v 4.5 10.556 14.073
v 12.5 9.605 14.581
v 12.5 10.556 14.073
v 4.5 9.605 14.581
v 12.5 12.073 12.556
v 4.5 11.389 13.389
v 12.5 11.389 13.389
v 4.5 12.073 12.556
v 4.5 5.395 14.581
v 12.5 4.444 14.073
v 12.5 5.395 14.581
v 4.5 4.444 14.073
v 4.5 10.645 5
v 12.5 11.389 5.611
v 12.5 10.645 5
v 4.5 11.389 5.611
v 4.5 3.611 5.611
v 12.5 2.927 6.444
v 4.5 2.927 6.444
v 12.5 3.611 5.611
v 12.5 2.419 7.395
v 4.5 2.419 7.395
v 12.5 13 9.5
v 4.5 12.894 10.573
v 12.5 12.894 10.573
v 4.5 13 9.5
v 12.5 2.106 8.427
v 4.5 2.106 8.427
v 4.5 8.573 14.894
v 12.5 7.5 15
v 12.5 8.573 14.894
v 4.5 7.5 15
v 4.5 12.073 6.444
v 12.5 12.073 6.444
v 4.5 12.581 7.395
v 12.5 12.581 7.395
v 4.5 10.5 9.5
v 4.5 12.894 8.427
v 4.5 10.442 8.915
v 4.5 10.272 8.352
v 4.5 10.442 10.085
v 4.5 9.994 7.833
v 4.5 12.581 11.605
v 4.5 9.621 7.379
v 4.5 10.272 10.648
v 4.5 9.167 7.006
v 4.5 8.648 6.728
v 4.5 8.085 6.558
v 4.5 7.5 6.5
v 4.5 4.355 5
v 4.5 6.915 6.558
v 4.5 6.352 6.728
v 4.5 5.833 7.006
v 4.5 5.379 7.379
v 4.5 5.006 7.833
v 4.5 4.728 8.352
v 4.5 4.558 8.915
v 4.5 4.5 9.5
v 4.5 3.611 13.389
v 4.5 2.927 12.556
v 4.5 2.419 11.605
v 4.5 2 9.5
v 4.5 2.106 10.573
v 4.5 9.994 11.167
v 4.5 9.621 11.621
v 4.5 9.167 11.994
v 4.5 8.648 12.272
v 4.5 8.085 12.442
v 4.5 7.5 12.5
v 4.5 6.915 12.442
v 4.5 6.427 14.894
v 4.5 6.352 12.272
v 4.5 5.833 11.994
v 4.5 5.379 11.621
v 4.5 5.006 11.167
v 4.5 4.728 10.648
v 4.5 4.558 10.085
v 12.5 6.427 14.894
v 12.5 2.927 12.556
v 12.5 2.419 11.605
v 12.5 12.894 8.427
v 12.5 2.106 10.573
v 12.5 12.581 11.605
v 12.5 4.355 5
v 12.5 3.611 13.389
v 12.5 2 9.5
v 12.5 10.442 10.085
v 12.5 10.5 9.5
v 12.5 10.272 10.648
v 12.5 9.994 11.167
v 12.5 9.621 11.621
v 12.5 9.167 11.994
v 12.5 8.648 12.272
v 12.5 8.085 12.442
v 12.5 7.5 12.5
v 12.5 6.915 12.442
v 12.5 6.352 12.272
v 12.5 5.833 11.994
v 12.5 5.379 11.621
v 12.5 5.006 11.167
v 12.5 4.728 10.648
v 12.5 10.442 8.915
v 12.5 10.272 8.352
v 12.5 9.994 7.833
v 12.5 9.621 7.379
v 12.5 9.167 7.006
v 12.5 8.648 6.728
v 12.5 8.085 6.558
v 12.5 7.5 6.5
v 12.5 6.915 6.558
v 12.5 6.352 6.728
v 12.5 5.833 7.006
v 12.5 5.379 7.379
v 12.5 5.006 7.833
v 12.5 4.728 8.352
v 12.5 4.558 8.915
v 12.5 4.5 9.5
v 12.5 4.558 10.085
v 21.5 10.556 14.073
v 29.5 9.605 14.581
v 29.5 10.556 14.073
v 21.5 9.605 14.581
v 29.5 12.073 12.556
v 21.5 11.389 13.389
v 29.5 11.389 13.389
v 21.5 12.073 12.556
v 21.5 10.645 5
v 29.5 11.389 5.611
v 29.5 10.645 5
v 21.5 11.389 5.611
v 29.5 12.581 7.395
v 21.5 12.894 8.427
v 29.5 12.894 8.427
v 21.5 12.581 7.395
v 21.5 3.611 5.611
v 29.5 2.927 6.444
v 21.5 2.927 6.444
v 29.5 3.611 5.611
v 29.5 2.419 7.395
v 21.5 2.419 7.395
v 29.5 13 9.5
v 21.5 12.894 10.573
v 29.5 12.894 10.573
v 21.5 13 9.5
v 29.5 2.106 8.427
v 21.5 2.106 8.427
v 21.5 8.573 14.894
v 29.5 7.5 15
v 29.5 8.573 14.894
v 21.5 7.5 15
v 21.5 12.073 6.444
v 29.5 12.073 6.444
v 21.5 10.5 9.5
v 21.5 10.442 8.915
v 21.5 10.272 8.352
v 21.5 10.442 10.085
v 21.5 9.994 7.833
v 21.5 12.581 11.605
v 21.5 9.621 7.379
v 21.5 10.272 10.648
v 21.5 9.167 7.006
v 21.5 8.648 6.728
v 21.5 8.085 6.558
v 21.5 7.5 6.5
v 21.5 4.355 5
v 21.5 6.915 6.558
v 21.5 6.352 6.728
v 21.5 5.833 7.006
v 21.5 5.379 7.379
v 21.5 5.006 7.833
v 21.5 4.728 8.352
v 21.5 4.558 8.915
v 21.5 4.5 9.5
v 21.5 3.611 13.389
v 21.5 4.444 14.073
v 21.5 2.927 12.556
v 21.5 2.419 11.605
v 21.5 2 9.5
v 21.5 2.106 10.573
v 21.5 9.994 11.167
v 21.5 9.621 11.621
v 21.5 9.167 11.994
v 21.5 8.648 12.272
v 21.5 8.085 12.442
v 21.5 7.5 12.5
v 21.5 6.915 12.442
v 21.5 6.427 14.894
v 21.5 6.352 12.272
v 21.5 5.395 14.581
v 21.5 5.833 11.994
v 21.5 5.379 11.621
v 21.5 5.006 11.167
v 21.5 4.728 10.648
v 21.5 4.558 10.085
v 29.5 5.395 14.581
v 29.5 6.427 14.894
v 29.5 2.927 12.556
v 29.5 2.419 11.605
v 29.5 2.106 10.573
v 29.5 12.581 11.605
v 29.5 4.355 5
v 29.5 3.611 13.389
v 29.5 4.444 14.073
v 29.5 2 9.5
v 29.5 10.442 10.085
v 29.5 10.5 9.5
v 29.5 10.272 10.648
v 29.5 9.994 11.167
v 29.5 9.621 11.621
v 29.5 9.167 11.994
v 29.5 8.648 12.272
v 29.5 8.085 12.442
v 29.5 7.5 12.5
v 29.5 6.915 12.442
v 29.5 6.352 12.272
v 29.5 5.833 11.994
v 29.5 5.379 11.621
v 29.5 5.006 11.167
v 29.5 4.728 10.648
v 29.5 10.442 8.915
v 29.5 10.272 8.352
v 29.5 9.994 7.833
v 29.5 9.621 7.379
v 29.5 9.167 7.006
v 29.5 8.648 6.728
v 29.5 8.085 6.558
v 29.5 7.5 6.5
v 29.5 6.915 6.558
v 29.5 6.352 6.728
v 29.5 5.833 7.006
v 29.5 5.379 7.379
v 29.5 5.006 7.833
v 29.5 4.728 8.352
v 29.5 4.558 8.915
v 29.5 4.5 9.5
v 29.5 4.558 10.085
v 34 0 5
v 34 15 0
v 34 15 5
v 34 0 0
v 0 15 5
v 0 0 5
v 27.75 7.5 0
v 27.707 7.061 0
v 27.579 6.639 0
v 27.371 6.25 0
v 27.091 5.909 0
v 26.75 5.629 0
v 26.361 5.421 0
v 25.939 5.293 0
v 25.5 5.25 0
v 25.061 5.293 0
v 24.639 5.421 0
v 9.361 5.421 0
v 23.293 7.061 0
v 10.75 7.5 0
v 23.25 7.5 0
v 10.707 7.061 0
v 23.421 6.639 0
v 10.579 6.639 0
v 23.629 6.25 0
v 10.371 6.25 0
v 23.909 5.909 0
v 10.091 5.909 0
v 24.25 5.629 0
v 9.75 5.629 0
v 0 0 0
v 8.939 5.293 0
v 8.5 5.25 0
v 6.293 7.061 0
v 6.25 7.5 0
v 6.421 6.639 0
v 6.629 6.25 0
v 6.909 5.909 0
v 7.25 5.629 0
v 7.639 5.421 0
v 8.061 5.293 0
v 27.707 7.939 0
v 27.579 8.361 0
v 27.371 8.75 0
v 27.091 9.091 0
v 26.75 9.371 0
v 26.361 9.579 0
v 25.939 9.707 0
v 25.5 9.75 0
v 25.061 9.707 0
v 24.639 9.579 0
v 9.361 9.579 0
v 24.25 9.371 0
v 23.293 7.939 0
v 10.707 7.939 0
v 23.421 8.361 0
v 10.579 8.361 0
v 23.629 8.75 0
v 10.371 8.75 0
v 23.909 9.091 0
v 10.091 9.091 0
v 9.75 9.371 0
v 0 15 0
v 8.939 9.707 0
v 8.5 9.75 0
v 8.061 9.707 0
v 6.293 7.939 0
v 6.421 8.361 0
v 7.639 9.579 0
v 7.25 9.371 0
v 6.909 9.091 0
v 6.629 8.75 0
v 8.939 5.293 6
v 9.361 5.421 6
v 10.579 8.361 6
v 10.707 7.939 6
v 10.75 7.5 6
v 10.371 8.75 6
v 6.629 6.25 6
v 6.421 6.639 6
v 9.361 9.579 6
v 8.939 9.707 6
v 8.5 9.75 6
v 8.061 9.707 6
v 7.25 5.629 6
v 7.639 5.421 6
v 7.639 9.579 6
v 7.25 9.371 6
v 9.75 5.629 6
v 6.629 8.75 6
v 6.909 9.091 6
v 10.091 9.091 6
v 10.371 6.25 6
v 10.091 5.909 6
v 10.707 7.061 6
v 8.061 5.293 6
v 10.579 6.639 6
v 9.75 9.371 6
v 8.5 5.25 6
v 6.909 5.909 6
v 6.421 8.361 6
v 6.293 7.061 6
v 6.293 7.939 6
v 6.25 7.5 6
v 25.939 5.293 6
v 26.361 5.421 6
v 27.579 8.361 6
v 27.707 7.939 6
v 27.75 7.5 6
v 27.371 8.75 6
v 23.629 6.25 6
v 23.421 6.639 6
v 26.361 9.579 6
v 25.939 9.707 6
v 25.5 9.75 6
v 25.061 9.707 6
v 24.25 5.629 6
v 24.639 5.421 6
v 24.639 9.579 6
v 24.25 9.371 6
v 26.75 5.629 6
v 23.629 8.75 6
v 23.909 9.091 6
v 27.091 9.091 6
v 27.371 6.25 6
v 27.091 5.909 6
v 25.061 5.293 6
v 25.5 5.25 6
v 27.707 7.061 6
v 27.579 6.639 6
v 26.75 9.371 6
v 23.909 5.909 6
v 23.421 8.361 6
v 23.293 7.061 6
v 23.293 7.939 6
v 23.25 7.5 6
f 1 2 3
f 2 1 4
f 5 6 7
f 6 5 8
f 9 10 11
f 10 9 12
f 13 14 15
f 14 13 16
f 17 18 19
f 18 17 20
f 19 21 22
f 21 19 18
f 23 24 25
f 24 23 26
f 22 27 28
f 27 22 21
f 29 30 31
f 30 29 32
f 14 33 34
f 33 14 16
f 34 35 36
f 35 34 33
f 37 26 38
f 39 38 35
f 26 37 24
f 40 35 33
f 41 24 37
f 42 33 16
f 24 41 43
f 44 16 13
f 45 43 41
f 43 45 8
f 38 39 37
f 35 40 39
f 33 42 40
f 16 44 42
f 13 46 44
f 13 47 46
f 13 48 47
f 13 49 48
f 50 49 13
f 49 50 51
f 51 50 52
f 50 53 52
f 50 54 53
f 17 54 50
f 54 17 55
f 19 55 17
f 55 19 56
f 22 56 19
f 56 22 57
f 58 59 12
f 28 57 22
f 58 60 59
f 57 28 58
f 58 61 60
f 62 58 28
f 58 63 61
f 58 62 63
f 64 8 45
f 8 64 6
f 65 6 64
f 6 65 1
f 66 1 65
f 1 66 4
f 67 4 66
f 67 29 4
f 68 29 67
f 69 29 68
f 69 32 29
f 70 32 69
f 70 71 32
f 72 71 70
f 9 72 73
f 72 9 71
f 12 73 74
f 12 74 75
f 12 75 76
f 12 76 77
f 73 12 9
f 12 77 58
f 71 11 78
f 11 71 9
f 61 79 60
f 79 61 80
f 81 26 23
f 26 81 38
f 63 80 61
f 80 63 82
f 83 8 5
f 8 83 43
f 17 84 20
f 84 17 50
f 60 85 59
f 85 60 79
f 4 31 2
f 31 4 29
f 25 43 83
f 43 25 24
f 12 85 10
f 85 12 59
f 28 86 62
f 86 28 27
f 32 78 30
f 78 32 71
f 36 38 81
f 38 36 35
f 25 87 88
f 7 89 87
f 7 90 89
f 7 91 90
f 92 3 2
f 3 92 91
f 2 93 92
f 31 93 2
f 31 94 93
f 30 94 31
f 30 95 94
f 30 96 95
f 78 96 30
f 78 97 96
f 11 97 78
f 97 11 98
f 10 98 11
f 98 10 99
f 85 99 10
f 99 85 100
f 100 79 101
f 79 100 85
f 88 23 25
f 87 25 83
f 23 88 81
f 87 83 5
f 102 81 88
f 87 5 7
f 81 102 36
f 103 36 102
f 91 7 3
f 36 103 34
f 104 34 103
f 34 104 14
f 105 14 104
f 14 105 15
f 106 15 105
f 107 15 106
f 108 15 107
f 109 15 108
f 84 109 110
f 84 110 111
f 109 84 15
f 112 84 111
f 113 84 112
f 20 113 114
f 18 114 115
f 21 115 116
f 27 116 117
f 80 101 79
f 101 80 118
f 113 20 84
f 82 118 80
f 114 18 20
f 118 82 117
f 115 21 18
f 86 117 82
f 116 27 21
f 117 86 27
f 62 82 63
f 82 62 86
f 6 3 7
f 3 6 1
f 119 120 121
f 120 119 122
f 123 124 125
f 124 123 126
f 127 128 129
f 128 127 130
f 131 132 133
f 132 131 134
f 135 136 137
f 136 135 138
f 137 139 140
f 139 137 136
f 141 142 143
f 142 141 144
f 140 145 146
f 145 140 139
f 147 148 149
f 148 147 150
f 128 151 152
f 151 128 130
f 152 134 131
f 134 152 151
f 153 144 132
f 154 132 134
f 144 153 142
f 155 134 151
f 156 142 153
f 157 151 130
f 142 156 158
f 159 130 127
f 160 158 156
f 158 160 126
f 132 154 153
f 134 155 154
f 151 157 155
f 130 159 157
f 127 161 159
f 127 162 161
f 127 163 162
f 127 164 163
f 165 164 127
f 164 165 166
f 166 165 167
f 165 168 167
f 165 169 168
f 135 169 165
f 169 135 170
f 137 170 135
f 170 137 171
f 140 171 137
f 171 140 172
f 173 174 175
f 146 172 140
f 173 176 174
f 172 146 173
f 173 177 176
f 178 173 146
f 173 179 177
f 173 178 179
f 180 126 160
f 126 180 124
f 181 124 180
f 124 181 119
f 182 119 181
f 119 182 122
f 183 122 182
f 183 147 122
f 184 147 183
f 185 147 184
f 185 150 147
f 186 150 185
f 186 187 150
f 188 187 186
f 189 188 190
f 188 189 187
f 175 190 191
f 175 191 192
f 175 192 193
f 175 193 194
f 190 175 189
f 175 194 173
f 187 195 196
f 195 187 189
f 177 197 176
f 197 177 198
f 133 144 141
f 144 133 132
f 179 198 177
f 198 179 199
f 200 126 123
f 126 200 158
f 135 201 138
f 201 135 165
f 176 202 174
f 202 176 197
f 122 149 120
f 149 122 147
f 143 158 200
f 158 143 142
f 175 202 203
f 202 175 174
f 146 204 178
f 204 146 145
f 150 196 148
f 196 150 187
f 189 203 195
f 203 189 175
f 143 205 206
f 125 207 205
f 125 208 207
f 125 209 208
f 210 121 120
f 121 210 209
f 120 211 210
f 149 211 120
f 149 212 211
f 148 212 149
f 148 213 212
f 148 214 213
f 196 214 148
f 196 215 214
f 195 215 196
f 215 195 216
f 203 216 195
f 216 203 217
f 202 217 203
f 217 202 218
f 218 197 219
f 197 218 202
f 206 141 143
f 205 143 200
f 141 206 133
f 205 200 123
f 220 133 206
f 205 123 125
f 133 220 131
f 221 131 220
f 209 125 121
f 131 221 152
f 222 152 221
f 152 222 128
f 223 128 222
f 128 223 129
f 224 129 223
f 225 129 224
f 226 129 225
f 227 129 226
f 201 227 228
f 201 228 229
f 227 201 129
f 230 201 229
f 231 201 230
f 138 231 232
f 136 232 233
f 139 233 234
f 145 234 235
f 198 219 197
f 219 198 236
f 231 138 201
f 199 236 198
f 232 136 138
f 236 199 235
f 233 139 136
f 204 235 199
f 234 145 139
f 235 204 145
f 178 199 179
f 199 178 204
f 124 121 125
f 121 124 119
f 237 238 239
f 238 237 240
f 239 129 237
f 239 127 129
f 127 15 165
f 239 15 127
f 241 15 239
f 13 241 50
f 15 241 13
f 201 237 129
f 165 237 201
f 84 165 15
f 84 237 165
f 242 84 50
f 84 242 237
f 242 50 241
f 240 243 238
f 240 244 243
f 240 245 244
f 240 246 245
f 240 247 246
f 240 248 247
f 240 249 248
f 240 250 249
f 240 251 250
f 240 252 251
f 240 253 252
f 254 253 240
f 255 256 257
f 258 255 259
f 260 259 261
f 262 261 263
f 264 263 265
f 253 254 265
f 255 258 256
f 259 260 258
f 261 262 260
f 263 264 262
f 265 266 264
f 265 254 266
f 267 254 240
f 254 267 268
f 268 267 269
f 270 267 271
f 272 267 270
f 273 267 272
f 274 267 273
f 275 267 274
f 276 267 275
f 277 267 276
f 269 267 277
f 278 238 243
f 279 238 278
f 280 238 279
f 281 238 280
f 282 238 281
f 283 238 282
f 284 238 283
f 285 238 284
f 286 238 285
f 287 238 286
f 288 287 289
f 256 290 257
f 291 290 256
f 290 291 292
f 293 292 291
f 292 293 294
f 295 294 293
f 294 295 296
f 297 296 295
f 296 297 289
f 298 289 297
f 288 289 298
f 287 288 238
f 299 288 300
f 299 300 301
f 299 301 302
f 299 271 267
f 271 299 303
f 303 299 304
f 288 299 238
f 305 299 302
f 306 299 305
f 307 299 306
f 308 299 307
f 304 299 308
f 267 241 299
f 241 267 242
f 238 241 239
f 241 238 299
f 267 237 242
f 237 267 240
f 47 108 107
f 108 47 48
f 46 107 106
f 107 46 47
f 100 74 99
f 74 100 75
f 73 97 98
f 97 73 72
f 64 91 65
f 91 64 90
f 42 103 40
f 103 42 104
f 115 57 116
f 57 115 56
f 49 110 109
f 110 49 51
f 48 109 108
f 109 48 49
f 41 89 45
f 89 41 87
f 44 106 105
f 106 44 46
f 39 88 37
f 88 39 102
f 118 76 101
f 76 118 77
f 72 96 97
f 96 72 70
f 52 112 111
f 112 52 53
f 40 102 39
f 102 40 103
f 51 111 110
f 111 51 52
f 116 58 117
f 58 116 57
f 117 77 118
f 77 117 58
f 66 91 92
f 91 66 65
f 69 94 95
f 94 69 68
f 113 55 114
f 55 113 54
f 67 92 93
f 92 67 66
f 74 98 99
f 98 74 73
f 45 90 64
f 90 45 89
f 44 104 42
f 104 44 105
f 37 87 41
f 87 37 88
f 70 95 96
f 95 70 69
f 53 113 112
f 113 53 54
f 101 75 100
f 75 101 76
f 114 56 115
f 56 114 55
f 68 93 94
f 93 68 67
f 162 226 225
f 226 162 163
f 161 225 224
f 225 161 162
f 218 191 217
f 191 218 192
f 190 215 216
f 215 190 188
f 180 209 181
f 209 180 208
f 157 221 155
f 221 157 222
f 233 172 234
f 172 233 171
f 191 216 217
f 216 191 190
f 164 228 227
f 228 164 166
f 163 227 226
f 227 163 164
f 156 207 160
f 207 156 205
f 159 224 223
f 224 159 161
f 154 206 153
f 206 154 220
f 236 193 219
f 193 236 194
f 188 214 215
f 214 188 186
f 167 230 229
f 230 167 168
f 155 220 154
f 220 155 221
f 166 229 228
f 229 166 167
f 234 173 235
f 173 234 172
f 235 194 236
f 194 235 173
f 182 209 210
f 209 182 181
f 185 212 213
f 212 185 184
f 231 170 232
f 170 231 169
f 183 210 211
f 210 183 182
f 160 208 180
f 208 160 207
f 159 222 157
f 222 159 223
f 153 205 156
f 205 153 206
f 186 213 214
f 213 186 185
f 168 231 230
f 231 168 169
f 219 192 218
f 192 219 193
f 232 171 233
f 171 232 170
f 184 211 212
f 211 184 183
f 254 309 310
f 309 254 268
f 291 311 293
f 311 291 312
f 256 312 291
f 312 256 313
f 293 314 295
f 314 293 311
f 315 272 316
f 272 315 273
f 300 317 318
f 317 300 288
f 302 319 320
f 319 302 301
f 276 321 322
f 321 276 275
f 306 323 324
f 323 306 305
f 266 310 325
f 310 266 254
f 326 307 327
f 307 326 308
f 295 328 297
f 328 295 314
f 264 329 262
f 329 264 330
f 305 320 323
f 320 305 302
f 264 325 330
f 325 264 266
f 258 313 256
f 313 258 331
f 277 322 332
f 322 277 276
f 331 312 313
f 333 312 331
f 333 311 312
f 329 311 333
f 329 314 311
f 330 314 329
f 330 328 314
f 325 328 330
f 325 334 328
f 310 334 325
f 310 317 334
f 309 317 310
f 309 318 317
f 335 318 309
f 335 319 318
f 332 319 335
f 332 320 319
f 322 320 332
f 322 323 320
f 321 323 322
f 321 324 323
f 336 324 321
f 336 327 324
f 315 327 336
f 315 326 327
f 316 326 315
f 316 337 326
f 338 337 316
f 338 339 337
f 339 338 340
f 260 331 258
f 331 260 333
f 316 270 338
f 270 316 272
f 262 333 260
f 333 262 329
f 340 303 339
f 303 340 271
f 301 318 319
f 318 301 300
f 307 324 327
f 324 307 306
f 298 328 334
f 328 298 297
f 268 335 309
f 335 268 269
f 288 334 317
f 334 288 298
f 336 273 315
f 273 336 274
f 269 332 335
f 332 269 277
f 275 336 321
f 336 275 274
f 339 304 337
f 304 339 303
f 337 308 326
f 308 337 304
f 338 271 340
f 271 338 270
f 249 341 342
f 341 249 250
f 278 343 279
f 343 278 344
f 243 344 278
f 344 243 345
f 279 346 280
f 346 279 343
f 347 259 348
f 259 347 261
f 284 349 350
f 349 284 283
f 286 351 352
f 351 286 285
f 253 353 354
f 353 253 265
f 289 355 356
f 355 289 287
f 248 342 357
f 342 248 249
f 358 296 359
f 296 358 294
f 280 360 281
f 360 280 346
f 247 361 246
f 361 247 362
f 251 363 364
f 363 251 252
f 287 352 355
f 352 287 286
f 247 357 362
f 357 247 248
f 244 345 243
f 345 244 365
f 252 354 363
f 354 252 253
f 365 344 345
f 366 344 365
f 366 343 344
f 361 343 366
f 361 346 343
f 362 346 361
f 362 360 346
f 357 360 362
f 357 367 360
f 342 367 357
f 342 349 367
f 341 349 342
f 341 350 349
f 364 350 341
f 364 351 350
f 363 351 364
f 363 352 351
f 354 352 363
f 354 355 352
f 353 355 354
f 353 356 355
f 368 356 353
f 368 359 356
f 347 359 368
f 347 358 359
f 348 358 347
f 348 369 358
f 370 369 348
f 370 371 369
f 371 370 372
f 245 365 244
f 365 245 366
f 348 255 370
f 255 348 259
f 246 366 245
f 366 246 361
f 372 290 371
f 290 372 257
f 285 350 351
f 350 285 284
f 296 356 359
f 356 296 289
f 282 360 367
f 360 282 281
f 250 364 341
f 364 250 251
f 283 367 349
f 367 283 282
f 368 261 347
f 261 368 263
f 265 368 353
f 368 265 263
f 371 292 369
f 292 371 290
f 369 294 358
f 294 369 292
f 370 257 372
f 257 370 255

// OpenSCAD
$fn = 32;

// ----------------------------------------------------------------------
// Cable clip: cable 6 mm, clamp 11 mm, base 34 mm
// ----------------------------------------------------------------------

// --- parameters (mm) ---
foot_w = 34;              // base length, X
foot_d = 15;              // base width, Y
foot_t = 5;               // base thickness
hose_seat_d = 11;         // clamp outside diameter
ring_t = 2.5;             // clamp wall
cable_d = 6;              // cable opening
ring_w = 8;               // clamp width along the cable
screw_d = 4.5;            // screw clearance
sink = 1;                 // overlap of the clamp into the base
pitch = 17;               // distance between the two clamps

module base() {
  cube([foot_w, foot_d, foot_t]);
}

module clamps() {
  for (sx = [-1, 1])
    translate([foot_w / 2 + sx * pitch / 2, foot_d / 2, foot_t + hose_seat_d / 2 - sink]) rotate([0, 90, 0])
      cylinder(h = ring_w, d = hose_seat_d, center = true);
}

difference() {
  union() {
    base();
    clamps();
  }
  for (sx = [-1, 1])
    translate([foot_w / 2 + sx * pitch / 2, foot_d / 2, foot_t + hose_seat_d / 2 - sink]) rotate([0, 90, 0]) translate([0, 0, -ring_w / 2 - 1]) cylinder(h = ring_w + 2, d = cable_d);
  translate([8.5, foot_d / 2, -1]) cylinder(h = foot_t + 2, d = screw_d);
  translate([25.5, foot_d / 2, -1]) cylinder(h = foot_t + 2, d = screw_d);
}
